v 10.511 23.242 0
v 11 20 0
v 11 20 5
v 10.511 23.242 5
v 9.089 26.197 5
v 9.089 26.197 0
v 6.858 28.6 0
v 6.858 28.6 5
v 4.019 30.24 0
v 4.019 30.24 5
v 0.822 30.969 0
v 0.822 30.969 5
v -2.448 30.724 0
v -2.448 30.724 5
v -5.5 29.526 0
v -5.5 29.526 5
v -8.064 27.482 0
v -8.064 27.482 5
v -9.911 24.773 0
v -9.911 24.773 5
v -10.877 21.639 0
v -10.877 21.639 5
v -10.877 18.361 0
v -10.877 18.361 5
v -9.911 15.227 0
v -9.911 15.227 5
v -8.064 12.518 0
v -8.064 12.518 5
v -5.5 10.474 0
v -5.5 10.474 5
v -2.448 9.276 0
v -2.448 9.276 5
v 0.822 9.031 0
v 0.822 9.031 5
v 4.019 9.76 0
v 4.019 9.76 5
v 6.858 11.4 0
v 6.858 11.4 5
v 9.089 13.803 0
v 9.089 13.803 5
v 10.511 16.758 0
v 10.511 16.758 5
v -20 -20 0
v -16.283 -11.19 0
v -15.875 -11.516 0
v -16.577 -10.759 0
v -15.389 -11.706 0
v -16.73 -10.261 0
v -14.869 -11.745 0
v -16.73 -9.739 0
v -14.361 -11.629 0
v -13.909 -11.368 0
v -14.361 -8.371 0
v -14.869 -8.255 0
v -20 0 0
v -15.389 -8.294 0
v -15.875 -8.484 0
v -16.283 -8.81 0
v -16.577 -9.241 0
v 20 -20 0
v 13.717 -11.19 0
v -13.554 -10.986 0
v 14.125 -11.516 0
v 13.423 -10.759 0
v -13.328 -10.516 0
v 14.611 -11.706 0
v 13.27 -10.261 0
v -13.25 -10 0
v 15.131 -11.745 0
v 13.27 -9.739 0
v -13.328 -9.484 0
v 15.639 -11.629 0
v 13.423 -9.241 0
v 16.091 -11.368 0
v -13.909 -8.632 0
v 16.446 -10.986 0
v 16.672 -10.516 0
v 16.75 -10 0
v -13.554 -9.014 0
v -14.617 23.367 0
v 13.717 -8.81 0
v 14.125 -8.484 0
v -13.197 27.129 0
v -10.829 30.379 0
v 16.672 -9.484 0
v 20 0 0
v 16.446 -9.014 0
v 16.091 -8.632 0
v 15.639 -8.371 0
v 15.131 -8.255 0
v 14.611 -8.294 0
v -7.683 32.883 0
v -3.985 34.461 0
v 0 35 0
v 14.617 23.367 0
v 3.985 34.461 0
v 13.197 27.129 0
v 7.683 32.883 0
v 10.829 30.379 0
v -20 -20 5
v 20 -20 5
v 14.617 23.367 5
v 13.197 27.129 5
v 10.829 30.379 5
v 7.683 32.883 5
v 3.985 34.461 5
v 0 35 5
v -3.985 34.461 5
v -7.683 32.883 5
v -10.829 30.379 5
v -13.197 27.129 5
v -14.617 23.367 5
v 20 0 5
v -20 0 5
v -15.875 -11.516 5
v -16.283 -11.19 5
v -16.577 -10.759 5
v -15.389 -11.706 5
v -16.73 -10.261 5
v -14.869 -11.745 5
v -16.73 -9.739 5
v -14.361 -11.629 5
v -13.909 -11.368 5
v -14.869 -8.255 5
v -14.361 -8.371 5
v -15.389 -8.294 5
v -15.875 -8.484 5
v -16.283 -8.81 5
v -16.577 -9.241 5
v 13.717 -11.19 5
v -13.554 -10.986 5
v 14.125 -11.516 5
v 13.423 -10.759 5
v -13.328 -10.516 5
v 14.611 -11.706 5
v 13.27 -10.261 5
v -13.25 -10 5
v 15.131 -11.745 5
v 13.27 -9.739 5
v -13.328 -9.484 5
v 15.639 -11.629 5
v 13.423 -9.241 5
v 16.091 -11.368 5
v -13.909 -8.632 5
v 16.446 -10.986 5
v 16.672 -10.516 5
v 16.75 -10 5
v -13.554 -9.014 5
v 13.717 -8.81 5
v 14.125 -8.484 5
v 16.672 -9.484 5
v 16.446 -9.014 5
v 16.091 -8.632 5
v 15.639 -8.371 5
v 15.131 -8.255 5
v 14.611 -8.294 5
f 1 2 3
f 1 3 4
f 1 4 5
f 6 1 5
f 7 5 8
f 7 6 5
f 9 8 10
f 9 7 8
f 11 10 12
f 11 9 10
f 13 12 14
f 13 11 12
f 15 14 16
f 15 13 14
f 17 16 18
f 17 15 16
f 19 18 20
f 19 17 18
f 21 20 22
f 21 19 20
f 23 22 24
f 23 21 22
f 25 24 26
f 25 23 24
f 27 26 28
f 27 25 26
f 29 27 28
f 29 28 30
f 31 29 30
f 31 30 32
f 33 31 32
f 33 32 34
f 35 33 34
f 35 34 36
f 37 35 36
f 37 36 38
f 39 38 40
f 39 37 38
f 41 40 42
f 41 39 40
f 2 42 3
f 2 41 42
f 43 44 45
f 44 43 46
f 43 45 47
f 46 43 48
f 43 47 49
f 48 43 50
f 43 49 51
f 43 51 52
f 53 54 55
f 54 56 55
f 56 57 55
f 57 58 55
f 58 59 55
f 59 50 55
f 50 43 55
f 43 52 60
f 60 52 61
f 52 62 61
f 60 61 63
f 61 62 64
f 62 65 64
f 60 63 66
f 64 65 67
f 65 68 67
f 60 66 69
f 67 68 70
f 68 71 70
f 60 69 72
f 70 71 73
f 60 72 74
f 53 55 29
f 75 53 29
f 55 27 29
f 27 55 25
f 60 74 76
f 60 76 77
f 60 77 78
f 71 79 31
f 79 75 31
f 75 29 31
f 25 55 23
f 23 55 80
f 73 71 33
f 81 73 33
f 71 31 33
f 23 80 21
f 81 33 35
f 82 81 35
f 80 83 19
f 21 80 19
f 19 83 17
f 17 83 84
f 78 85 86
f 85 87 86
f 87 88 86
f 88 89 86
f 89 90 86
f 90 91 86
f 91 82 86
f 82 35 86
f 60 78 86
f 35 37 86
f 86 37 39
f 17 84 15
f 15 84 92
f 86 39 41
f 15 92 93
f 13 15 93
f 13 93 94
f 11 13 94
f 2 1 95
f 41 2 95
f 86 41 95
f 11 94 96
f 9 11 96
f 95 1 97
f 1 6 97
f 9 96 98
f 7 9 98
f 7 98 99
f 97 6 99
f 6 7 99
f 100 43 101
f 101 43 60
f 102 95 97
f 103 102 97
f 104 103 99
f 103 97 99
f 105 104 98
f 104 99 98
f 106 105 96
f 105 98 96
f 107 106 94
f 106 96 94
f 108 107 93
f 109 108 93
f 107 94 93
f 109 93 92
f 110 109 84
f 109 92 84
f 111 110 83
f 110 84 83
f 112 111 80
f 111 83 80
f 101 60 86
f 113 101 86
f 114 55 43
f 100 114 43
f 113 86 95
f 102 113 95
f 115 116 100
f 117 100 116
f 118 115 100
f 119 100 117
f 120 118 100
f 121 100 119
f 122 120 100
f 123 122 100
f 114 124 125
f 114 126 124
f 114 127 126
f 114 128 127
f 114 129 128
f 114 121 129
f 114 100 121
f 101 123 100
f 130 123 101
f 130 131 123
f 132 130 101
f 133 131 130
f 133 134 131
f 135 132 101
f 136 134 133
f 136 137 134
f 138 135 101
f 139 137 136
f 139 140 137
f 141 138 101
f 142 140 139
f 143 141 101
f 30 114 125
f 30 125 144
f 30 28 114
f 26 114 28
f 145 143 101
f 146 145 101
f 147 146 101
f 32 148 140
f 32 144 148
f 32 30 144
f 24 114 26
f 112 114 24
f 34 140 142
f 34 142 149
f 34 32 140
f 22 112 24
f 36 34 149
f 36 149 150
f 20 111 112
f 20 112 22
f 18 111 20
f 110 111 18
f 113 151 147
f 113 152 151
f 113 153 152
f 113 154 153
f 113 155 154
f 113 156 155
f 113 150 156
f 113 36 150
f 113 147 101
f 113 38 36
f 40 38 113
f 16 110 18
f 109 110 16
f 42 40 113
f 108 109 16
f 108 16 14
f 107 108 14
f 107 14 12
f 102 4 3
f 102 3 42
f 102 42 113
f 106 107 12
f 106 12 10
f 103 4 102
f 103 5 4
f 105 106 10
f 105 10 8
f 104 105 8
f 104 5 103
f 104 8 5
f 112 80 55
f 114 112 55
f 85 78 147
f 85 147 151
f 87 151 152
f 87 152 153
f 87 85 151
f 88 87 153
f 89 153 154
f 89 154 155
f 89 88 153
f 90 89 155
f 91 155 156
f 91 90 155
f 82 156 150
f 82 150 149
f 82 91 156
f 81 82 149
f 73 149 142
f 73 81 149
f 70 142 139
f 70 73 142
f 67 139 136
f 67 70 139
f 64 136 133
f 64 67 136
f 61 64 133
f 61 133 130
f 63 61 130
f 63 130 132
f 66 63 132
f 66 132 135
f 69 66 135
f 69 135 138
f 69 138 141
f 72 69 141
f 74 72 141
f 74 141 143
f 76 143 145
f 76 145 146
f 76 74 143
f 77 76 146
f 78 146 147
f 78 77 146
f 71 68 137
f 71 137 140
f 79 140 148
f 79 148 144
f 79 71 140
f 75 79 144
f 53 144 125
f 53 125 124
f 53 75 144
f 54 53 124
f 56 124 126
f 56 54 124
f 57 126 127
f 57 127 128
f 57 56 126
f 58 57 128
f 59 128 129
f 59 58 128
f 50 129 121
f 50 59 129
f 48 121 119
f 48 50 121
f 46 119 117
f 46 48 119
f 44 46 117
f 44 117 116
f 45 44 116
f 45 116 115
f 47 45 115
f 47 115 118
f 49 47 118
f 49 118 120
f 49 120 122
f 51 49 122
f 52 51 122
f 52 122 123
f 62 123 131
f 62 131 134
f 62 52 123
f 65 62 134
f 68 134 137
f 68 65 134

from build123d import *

# Parameters (mm, degrees)
SKETCH1_R           = 11
SKETCH1_R_2         = 1.75
BOSS_EXTRUDE1_DEPTH = 5


with BuildPart() as part:
    # Sketch1 → Boss-Extrude1 (new body)
    with BuildSketch(Plane.XY):
        with BuildLine():
            Line((-14.617184106, 23.367184106), (-20, 0))
            Line((-20, 0), (-20, -20))
            Line((-20, -20), (20, -20))
            Line((20, -20), (20, 0))
            Line((20, 0), (14.617184106, 23.367184106))
            ThreePointArc((14.617184106, 23.367184106), (0, 35), (-14.617184106, 23.367184106))
        make_face()
        with Locations((0, 20)):
            Circle(SKETCH1_R, mode=Mode.SUBTRACT)
        with Locations((-15, -10)):
            Circle(SKETCH1_R_2, mode=Mode.SUBTRACT)
        with Locations((15, -10)):
            Circle(SKETCH1_R_2, mode=Mode.SUBTRACT)
    extrude(amount=BOSS_EXTRUDE1_DEPTH)


solid = part.part
